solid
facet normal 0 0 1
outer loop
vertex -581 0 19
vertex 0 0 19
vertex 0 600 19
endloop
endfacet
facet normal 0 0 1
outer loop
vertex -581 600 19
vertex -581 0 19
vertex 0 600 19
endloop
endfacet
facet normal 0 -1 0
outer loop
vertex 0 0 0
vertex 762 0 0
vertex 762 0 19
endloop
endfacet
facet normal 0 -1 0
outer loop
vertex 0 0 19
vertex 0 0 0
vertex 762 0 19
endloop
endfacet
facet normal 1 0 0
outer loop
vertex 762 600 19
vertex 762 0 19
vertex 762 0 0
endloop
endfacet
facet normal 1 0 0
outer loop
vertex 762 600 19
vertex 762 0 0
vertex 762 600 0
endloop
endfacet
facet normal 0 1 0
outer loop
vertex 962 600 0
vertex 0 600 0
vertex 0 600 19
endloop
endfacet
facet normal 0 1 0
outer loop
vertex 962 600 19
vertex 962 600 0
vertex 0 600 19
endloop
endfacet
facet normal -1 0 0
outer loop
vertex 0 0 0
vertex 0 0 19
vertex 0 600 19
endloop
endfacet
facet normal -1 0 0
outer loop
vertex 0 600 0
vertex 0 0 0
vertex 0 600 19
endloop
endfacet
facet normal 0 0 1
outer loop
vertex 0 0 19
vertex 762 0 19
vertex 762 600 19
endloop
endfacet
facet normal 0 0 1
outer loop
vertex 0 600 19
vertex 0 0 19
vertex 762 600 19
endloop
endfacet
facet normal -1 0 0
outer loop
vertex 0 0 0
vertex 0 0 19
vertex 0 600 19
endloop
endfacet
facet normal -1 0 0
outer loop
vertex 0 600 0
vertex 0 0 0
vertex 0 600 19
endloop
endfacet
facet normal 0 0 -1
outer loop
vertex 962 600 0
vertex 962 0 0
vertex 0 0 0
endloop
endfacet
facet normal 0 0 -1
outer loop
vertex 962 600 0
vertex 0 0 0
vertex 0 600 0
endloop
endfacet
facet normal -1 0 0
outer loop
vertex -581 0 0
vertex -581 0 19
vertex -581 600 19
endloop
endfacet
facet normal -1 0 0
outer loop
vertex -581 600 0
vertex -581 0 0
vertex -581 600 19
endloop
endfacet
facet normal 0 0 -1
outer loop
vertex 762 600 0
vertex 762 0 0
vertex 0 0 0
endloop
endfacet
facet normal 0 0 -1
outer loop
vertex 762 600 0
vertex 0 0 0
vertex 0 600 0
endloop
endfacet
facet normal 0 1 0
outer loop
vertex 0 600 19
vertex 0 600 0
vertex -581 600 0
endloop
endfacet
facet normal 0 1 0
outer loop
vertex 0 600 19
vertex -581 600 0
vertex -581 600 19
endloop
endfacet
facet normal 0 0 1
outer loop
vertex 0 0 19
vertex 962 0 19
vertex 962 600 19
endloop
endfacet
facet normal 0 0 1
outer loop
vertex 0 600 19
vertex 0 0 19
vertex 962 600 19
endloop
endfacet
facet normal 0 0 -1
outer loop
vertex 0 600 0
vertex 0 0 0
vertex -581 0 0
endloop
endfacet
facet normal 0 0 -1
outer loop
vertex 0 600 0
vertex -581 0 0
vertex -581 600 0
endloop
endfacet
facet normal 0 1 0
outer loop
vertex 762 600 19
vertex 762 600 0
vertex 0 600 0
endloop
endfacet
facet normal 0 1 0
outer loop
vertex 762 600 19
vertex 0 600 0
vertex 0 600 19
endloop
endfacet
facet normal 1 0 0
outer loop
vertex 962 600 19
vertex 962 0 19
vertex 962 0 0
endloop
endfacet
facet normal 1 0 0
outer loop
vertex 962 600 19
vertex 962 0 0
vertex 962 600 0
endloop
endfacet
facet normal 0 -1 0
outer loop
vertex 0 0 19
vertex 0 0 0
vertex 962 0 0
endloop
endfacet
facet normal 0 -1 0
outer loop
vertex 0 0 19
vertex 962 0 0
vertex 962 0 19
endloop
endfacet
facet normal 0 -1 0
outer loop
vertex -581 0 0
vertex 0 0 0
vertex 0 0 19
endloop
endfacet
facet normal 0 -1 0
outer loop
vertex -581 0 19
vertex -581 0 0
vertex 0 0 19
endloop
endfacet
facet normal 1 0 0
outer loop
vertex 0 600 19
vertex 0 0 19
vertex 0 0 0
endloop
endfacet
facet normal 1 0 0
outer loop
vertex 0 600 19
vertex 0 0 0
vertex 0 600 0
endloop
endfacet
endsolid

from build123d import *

# Parameters (mm, degrees)
F1_W     = 600
F1_H     = 19
F2_DEPTH = 762
F3_DEPTH = 581
F4_DEPTH = 962


with BuildPart() as f2:
    # F1 (on Right) → F2 (new body)
    with BuildSketch(Plane.YZ):
        with Locations((300, 9.5)):
            Rectangle(F1_W, F1_H)
    extrude(amount=F2_DEPTH)


with BuildPart() as f3:
    # F3 (new): a face of the model
    f3_faces = [f2.part.faces().sort_by_distance(p)[0] for p in [
        (0, 300, 9.5),
    ]]
    extrude(f3_faces, amount=F3_DEPTH)


with BuildPart() as f4:
    # F1 (on Right) → F4 (new body)
    with BuildSketch(Plane.YZ):
        with Locations((300, 9.5)):
            Rectangle(F1_W, F1_H)
    extrude(amount=F4_DEPTH)


solid = Compound([f2.part, f3.part, f4.part])
